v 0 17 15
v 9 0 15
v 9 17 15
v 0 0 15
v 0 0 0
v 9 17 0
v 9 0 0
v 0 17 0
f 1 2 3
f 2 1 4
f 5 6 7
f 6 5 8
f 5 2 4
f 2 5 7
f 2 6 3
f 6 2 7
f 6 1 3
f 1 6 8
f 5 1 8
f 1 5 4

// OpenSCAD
// Generated by SolidPython 1.0.1 on 2020-07-29 00:46:55


cube(size = [9, 17, 15]);
/***********************************************
*********      SolidPython code:      **********
************************************************
 
# import packages: SolidPython
from solid import *
from solid.utils import *
from itertools import chain, combinations, permutations


class Resize:

    def __init__(self, scad_file):
        self.scad_file = scad_file
        #self.scad_file = import_scad(scad_file)
        # cone/cylinder param:
        self.r1 = 0
        self.r2 = 0
        self.h = 0
        # rectangular prism param:
        self.w = 0
        self.l = 0
        # ellipse param:
        self.r = 0

    # import OpenScad code (file name corresponds to shape)


    # classify shape + parameters
    def assign(self, param1, param2, param3):
        if self.scad_file == 'cone.scad':
            self.r1 = param1
            self.r2 = param2
            self.h = param3
        elif self.scad_file == 'cylinder.scad':
            self.r1 = param1
            self.r2 = param2
            self.h = param3
        elif self.scad_file == 'rectangularPrism.scad':
            self.h = param1
            self.l = param2
            self.w = param3
        else:
            self.r = param1
            self.h = param2

    # resize parameters
    def iterate(self):
        x = range(3, 20, 2)
        i = 1
        if self.scad_file == 'cone.scad':
            tempList = list(permutations(x, 2))
            for temp in tempList:
                param1 = temp[0]
                param2 = temp[1]
                filepath = 'produced_scad_files/' + 'cone' + str(param1) + '_' + str(param2) + '_' + '.scad'
                scad_render_to_file(cylinder(h=param1, r1=param2, r2=0), filepath)

        elif self.scad_file == 'cylinder.scad':
            tempList = list(permutations(x, 3))
            for temp in tempList:
                param1 = temp[0]
                param2 = temp[1]
                filepath = 'produced_scad_files/' + 'cylinder' + str(param1) + '_' + str(param2) + '_' + '.scad'
                scad_render_to_file(cylinder(h=param1, r1=param2, r2=param2), filepath)

        elif self.scad_file == 'rectangularPrism.scad':
            tempList = list(permutations(x, 3))
            for temp in tempList:
                param1 = temp[0]
                param2 = temp[1]
                param3 = temp[2]
                filepath = 'produced_scad_files/' + 'rectangularPrism' + str(param1) + '_' + str(param2) + '_' + str(
                    param3) + '.scad'
                scad_render_to_file(cube(size=(param1, param2, param3)), filepath)

        elif self.scad_file == 'ellipse.scad':
            tempList = list(permutations(x, 4))
            for temp in tempList:
                param1 = temp[0]
                param2 = temp[1]
                param3 = temp[2]
                param4 = temp[3]
                filepath = 'produced_scad_files/' + 'ellipse' + str(param1) + '_' + str(param2) + '_' + str(param3) + '_' + str(param4) + '.scad'
                scad_render_to_file(scale([param1, param2, param3])(sphere(r=param4)), filepath)

    def render_to_scadfile(self):
        scad_render_to_file(scad, 'example.scad') 
 
************************************************/
